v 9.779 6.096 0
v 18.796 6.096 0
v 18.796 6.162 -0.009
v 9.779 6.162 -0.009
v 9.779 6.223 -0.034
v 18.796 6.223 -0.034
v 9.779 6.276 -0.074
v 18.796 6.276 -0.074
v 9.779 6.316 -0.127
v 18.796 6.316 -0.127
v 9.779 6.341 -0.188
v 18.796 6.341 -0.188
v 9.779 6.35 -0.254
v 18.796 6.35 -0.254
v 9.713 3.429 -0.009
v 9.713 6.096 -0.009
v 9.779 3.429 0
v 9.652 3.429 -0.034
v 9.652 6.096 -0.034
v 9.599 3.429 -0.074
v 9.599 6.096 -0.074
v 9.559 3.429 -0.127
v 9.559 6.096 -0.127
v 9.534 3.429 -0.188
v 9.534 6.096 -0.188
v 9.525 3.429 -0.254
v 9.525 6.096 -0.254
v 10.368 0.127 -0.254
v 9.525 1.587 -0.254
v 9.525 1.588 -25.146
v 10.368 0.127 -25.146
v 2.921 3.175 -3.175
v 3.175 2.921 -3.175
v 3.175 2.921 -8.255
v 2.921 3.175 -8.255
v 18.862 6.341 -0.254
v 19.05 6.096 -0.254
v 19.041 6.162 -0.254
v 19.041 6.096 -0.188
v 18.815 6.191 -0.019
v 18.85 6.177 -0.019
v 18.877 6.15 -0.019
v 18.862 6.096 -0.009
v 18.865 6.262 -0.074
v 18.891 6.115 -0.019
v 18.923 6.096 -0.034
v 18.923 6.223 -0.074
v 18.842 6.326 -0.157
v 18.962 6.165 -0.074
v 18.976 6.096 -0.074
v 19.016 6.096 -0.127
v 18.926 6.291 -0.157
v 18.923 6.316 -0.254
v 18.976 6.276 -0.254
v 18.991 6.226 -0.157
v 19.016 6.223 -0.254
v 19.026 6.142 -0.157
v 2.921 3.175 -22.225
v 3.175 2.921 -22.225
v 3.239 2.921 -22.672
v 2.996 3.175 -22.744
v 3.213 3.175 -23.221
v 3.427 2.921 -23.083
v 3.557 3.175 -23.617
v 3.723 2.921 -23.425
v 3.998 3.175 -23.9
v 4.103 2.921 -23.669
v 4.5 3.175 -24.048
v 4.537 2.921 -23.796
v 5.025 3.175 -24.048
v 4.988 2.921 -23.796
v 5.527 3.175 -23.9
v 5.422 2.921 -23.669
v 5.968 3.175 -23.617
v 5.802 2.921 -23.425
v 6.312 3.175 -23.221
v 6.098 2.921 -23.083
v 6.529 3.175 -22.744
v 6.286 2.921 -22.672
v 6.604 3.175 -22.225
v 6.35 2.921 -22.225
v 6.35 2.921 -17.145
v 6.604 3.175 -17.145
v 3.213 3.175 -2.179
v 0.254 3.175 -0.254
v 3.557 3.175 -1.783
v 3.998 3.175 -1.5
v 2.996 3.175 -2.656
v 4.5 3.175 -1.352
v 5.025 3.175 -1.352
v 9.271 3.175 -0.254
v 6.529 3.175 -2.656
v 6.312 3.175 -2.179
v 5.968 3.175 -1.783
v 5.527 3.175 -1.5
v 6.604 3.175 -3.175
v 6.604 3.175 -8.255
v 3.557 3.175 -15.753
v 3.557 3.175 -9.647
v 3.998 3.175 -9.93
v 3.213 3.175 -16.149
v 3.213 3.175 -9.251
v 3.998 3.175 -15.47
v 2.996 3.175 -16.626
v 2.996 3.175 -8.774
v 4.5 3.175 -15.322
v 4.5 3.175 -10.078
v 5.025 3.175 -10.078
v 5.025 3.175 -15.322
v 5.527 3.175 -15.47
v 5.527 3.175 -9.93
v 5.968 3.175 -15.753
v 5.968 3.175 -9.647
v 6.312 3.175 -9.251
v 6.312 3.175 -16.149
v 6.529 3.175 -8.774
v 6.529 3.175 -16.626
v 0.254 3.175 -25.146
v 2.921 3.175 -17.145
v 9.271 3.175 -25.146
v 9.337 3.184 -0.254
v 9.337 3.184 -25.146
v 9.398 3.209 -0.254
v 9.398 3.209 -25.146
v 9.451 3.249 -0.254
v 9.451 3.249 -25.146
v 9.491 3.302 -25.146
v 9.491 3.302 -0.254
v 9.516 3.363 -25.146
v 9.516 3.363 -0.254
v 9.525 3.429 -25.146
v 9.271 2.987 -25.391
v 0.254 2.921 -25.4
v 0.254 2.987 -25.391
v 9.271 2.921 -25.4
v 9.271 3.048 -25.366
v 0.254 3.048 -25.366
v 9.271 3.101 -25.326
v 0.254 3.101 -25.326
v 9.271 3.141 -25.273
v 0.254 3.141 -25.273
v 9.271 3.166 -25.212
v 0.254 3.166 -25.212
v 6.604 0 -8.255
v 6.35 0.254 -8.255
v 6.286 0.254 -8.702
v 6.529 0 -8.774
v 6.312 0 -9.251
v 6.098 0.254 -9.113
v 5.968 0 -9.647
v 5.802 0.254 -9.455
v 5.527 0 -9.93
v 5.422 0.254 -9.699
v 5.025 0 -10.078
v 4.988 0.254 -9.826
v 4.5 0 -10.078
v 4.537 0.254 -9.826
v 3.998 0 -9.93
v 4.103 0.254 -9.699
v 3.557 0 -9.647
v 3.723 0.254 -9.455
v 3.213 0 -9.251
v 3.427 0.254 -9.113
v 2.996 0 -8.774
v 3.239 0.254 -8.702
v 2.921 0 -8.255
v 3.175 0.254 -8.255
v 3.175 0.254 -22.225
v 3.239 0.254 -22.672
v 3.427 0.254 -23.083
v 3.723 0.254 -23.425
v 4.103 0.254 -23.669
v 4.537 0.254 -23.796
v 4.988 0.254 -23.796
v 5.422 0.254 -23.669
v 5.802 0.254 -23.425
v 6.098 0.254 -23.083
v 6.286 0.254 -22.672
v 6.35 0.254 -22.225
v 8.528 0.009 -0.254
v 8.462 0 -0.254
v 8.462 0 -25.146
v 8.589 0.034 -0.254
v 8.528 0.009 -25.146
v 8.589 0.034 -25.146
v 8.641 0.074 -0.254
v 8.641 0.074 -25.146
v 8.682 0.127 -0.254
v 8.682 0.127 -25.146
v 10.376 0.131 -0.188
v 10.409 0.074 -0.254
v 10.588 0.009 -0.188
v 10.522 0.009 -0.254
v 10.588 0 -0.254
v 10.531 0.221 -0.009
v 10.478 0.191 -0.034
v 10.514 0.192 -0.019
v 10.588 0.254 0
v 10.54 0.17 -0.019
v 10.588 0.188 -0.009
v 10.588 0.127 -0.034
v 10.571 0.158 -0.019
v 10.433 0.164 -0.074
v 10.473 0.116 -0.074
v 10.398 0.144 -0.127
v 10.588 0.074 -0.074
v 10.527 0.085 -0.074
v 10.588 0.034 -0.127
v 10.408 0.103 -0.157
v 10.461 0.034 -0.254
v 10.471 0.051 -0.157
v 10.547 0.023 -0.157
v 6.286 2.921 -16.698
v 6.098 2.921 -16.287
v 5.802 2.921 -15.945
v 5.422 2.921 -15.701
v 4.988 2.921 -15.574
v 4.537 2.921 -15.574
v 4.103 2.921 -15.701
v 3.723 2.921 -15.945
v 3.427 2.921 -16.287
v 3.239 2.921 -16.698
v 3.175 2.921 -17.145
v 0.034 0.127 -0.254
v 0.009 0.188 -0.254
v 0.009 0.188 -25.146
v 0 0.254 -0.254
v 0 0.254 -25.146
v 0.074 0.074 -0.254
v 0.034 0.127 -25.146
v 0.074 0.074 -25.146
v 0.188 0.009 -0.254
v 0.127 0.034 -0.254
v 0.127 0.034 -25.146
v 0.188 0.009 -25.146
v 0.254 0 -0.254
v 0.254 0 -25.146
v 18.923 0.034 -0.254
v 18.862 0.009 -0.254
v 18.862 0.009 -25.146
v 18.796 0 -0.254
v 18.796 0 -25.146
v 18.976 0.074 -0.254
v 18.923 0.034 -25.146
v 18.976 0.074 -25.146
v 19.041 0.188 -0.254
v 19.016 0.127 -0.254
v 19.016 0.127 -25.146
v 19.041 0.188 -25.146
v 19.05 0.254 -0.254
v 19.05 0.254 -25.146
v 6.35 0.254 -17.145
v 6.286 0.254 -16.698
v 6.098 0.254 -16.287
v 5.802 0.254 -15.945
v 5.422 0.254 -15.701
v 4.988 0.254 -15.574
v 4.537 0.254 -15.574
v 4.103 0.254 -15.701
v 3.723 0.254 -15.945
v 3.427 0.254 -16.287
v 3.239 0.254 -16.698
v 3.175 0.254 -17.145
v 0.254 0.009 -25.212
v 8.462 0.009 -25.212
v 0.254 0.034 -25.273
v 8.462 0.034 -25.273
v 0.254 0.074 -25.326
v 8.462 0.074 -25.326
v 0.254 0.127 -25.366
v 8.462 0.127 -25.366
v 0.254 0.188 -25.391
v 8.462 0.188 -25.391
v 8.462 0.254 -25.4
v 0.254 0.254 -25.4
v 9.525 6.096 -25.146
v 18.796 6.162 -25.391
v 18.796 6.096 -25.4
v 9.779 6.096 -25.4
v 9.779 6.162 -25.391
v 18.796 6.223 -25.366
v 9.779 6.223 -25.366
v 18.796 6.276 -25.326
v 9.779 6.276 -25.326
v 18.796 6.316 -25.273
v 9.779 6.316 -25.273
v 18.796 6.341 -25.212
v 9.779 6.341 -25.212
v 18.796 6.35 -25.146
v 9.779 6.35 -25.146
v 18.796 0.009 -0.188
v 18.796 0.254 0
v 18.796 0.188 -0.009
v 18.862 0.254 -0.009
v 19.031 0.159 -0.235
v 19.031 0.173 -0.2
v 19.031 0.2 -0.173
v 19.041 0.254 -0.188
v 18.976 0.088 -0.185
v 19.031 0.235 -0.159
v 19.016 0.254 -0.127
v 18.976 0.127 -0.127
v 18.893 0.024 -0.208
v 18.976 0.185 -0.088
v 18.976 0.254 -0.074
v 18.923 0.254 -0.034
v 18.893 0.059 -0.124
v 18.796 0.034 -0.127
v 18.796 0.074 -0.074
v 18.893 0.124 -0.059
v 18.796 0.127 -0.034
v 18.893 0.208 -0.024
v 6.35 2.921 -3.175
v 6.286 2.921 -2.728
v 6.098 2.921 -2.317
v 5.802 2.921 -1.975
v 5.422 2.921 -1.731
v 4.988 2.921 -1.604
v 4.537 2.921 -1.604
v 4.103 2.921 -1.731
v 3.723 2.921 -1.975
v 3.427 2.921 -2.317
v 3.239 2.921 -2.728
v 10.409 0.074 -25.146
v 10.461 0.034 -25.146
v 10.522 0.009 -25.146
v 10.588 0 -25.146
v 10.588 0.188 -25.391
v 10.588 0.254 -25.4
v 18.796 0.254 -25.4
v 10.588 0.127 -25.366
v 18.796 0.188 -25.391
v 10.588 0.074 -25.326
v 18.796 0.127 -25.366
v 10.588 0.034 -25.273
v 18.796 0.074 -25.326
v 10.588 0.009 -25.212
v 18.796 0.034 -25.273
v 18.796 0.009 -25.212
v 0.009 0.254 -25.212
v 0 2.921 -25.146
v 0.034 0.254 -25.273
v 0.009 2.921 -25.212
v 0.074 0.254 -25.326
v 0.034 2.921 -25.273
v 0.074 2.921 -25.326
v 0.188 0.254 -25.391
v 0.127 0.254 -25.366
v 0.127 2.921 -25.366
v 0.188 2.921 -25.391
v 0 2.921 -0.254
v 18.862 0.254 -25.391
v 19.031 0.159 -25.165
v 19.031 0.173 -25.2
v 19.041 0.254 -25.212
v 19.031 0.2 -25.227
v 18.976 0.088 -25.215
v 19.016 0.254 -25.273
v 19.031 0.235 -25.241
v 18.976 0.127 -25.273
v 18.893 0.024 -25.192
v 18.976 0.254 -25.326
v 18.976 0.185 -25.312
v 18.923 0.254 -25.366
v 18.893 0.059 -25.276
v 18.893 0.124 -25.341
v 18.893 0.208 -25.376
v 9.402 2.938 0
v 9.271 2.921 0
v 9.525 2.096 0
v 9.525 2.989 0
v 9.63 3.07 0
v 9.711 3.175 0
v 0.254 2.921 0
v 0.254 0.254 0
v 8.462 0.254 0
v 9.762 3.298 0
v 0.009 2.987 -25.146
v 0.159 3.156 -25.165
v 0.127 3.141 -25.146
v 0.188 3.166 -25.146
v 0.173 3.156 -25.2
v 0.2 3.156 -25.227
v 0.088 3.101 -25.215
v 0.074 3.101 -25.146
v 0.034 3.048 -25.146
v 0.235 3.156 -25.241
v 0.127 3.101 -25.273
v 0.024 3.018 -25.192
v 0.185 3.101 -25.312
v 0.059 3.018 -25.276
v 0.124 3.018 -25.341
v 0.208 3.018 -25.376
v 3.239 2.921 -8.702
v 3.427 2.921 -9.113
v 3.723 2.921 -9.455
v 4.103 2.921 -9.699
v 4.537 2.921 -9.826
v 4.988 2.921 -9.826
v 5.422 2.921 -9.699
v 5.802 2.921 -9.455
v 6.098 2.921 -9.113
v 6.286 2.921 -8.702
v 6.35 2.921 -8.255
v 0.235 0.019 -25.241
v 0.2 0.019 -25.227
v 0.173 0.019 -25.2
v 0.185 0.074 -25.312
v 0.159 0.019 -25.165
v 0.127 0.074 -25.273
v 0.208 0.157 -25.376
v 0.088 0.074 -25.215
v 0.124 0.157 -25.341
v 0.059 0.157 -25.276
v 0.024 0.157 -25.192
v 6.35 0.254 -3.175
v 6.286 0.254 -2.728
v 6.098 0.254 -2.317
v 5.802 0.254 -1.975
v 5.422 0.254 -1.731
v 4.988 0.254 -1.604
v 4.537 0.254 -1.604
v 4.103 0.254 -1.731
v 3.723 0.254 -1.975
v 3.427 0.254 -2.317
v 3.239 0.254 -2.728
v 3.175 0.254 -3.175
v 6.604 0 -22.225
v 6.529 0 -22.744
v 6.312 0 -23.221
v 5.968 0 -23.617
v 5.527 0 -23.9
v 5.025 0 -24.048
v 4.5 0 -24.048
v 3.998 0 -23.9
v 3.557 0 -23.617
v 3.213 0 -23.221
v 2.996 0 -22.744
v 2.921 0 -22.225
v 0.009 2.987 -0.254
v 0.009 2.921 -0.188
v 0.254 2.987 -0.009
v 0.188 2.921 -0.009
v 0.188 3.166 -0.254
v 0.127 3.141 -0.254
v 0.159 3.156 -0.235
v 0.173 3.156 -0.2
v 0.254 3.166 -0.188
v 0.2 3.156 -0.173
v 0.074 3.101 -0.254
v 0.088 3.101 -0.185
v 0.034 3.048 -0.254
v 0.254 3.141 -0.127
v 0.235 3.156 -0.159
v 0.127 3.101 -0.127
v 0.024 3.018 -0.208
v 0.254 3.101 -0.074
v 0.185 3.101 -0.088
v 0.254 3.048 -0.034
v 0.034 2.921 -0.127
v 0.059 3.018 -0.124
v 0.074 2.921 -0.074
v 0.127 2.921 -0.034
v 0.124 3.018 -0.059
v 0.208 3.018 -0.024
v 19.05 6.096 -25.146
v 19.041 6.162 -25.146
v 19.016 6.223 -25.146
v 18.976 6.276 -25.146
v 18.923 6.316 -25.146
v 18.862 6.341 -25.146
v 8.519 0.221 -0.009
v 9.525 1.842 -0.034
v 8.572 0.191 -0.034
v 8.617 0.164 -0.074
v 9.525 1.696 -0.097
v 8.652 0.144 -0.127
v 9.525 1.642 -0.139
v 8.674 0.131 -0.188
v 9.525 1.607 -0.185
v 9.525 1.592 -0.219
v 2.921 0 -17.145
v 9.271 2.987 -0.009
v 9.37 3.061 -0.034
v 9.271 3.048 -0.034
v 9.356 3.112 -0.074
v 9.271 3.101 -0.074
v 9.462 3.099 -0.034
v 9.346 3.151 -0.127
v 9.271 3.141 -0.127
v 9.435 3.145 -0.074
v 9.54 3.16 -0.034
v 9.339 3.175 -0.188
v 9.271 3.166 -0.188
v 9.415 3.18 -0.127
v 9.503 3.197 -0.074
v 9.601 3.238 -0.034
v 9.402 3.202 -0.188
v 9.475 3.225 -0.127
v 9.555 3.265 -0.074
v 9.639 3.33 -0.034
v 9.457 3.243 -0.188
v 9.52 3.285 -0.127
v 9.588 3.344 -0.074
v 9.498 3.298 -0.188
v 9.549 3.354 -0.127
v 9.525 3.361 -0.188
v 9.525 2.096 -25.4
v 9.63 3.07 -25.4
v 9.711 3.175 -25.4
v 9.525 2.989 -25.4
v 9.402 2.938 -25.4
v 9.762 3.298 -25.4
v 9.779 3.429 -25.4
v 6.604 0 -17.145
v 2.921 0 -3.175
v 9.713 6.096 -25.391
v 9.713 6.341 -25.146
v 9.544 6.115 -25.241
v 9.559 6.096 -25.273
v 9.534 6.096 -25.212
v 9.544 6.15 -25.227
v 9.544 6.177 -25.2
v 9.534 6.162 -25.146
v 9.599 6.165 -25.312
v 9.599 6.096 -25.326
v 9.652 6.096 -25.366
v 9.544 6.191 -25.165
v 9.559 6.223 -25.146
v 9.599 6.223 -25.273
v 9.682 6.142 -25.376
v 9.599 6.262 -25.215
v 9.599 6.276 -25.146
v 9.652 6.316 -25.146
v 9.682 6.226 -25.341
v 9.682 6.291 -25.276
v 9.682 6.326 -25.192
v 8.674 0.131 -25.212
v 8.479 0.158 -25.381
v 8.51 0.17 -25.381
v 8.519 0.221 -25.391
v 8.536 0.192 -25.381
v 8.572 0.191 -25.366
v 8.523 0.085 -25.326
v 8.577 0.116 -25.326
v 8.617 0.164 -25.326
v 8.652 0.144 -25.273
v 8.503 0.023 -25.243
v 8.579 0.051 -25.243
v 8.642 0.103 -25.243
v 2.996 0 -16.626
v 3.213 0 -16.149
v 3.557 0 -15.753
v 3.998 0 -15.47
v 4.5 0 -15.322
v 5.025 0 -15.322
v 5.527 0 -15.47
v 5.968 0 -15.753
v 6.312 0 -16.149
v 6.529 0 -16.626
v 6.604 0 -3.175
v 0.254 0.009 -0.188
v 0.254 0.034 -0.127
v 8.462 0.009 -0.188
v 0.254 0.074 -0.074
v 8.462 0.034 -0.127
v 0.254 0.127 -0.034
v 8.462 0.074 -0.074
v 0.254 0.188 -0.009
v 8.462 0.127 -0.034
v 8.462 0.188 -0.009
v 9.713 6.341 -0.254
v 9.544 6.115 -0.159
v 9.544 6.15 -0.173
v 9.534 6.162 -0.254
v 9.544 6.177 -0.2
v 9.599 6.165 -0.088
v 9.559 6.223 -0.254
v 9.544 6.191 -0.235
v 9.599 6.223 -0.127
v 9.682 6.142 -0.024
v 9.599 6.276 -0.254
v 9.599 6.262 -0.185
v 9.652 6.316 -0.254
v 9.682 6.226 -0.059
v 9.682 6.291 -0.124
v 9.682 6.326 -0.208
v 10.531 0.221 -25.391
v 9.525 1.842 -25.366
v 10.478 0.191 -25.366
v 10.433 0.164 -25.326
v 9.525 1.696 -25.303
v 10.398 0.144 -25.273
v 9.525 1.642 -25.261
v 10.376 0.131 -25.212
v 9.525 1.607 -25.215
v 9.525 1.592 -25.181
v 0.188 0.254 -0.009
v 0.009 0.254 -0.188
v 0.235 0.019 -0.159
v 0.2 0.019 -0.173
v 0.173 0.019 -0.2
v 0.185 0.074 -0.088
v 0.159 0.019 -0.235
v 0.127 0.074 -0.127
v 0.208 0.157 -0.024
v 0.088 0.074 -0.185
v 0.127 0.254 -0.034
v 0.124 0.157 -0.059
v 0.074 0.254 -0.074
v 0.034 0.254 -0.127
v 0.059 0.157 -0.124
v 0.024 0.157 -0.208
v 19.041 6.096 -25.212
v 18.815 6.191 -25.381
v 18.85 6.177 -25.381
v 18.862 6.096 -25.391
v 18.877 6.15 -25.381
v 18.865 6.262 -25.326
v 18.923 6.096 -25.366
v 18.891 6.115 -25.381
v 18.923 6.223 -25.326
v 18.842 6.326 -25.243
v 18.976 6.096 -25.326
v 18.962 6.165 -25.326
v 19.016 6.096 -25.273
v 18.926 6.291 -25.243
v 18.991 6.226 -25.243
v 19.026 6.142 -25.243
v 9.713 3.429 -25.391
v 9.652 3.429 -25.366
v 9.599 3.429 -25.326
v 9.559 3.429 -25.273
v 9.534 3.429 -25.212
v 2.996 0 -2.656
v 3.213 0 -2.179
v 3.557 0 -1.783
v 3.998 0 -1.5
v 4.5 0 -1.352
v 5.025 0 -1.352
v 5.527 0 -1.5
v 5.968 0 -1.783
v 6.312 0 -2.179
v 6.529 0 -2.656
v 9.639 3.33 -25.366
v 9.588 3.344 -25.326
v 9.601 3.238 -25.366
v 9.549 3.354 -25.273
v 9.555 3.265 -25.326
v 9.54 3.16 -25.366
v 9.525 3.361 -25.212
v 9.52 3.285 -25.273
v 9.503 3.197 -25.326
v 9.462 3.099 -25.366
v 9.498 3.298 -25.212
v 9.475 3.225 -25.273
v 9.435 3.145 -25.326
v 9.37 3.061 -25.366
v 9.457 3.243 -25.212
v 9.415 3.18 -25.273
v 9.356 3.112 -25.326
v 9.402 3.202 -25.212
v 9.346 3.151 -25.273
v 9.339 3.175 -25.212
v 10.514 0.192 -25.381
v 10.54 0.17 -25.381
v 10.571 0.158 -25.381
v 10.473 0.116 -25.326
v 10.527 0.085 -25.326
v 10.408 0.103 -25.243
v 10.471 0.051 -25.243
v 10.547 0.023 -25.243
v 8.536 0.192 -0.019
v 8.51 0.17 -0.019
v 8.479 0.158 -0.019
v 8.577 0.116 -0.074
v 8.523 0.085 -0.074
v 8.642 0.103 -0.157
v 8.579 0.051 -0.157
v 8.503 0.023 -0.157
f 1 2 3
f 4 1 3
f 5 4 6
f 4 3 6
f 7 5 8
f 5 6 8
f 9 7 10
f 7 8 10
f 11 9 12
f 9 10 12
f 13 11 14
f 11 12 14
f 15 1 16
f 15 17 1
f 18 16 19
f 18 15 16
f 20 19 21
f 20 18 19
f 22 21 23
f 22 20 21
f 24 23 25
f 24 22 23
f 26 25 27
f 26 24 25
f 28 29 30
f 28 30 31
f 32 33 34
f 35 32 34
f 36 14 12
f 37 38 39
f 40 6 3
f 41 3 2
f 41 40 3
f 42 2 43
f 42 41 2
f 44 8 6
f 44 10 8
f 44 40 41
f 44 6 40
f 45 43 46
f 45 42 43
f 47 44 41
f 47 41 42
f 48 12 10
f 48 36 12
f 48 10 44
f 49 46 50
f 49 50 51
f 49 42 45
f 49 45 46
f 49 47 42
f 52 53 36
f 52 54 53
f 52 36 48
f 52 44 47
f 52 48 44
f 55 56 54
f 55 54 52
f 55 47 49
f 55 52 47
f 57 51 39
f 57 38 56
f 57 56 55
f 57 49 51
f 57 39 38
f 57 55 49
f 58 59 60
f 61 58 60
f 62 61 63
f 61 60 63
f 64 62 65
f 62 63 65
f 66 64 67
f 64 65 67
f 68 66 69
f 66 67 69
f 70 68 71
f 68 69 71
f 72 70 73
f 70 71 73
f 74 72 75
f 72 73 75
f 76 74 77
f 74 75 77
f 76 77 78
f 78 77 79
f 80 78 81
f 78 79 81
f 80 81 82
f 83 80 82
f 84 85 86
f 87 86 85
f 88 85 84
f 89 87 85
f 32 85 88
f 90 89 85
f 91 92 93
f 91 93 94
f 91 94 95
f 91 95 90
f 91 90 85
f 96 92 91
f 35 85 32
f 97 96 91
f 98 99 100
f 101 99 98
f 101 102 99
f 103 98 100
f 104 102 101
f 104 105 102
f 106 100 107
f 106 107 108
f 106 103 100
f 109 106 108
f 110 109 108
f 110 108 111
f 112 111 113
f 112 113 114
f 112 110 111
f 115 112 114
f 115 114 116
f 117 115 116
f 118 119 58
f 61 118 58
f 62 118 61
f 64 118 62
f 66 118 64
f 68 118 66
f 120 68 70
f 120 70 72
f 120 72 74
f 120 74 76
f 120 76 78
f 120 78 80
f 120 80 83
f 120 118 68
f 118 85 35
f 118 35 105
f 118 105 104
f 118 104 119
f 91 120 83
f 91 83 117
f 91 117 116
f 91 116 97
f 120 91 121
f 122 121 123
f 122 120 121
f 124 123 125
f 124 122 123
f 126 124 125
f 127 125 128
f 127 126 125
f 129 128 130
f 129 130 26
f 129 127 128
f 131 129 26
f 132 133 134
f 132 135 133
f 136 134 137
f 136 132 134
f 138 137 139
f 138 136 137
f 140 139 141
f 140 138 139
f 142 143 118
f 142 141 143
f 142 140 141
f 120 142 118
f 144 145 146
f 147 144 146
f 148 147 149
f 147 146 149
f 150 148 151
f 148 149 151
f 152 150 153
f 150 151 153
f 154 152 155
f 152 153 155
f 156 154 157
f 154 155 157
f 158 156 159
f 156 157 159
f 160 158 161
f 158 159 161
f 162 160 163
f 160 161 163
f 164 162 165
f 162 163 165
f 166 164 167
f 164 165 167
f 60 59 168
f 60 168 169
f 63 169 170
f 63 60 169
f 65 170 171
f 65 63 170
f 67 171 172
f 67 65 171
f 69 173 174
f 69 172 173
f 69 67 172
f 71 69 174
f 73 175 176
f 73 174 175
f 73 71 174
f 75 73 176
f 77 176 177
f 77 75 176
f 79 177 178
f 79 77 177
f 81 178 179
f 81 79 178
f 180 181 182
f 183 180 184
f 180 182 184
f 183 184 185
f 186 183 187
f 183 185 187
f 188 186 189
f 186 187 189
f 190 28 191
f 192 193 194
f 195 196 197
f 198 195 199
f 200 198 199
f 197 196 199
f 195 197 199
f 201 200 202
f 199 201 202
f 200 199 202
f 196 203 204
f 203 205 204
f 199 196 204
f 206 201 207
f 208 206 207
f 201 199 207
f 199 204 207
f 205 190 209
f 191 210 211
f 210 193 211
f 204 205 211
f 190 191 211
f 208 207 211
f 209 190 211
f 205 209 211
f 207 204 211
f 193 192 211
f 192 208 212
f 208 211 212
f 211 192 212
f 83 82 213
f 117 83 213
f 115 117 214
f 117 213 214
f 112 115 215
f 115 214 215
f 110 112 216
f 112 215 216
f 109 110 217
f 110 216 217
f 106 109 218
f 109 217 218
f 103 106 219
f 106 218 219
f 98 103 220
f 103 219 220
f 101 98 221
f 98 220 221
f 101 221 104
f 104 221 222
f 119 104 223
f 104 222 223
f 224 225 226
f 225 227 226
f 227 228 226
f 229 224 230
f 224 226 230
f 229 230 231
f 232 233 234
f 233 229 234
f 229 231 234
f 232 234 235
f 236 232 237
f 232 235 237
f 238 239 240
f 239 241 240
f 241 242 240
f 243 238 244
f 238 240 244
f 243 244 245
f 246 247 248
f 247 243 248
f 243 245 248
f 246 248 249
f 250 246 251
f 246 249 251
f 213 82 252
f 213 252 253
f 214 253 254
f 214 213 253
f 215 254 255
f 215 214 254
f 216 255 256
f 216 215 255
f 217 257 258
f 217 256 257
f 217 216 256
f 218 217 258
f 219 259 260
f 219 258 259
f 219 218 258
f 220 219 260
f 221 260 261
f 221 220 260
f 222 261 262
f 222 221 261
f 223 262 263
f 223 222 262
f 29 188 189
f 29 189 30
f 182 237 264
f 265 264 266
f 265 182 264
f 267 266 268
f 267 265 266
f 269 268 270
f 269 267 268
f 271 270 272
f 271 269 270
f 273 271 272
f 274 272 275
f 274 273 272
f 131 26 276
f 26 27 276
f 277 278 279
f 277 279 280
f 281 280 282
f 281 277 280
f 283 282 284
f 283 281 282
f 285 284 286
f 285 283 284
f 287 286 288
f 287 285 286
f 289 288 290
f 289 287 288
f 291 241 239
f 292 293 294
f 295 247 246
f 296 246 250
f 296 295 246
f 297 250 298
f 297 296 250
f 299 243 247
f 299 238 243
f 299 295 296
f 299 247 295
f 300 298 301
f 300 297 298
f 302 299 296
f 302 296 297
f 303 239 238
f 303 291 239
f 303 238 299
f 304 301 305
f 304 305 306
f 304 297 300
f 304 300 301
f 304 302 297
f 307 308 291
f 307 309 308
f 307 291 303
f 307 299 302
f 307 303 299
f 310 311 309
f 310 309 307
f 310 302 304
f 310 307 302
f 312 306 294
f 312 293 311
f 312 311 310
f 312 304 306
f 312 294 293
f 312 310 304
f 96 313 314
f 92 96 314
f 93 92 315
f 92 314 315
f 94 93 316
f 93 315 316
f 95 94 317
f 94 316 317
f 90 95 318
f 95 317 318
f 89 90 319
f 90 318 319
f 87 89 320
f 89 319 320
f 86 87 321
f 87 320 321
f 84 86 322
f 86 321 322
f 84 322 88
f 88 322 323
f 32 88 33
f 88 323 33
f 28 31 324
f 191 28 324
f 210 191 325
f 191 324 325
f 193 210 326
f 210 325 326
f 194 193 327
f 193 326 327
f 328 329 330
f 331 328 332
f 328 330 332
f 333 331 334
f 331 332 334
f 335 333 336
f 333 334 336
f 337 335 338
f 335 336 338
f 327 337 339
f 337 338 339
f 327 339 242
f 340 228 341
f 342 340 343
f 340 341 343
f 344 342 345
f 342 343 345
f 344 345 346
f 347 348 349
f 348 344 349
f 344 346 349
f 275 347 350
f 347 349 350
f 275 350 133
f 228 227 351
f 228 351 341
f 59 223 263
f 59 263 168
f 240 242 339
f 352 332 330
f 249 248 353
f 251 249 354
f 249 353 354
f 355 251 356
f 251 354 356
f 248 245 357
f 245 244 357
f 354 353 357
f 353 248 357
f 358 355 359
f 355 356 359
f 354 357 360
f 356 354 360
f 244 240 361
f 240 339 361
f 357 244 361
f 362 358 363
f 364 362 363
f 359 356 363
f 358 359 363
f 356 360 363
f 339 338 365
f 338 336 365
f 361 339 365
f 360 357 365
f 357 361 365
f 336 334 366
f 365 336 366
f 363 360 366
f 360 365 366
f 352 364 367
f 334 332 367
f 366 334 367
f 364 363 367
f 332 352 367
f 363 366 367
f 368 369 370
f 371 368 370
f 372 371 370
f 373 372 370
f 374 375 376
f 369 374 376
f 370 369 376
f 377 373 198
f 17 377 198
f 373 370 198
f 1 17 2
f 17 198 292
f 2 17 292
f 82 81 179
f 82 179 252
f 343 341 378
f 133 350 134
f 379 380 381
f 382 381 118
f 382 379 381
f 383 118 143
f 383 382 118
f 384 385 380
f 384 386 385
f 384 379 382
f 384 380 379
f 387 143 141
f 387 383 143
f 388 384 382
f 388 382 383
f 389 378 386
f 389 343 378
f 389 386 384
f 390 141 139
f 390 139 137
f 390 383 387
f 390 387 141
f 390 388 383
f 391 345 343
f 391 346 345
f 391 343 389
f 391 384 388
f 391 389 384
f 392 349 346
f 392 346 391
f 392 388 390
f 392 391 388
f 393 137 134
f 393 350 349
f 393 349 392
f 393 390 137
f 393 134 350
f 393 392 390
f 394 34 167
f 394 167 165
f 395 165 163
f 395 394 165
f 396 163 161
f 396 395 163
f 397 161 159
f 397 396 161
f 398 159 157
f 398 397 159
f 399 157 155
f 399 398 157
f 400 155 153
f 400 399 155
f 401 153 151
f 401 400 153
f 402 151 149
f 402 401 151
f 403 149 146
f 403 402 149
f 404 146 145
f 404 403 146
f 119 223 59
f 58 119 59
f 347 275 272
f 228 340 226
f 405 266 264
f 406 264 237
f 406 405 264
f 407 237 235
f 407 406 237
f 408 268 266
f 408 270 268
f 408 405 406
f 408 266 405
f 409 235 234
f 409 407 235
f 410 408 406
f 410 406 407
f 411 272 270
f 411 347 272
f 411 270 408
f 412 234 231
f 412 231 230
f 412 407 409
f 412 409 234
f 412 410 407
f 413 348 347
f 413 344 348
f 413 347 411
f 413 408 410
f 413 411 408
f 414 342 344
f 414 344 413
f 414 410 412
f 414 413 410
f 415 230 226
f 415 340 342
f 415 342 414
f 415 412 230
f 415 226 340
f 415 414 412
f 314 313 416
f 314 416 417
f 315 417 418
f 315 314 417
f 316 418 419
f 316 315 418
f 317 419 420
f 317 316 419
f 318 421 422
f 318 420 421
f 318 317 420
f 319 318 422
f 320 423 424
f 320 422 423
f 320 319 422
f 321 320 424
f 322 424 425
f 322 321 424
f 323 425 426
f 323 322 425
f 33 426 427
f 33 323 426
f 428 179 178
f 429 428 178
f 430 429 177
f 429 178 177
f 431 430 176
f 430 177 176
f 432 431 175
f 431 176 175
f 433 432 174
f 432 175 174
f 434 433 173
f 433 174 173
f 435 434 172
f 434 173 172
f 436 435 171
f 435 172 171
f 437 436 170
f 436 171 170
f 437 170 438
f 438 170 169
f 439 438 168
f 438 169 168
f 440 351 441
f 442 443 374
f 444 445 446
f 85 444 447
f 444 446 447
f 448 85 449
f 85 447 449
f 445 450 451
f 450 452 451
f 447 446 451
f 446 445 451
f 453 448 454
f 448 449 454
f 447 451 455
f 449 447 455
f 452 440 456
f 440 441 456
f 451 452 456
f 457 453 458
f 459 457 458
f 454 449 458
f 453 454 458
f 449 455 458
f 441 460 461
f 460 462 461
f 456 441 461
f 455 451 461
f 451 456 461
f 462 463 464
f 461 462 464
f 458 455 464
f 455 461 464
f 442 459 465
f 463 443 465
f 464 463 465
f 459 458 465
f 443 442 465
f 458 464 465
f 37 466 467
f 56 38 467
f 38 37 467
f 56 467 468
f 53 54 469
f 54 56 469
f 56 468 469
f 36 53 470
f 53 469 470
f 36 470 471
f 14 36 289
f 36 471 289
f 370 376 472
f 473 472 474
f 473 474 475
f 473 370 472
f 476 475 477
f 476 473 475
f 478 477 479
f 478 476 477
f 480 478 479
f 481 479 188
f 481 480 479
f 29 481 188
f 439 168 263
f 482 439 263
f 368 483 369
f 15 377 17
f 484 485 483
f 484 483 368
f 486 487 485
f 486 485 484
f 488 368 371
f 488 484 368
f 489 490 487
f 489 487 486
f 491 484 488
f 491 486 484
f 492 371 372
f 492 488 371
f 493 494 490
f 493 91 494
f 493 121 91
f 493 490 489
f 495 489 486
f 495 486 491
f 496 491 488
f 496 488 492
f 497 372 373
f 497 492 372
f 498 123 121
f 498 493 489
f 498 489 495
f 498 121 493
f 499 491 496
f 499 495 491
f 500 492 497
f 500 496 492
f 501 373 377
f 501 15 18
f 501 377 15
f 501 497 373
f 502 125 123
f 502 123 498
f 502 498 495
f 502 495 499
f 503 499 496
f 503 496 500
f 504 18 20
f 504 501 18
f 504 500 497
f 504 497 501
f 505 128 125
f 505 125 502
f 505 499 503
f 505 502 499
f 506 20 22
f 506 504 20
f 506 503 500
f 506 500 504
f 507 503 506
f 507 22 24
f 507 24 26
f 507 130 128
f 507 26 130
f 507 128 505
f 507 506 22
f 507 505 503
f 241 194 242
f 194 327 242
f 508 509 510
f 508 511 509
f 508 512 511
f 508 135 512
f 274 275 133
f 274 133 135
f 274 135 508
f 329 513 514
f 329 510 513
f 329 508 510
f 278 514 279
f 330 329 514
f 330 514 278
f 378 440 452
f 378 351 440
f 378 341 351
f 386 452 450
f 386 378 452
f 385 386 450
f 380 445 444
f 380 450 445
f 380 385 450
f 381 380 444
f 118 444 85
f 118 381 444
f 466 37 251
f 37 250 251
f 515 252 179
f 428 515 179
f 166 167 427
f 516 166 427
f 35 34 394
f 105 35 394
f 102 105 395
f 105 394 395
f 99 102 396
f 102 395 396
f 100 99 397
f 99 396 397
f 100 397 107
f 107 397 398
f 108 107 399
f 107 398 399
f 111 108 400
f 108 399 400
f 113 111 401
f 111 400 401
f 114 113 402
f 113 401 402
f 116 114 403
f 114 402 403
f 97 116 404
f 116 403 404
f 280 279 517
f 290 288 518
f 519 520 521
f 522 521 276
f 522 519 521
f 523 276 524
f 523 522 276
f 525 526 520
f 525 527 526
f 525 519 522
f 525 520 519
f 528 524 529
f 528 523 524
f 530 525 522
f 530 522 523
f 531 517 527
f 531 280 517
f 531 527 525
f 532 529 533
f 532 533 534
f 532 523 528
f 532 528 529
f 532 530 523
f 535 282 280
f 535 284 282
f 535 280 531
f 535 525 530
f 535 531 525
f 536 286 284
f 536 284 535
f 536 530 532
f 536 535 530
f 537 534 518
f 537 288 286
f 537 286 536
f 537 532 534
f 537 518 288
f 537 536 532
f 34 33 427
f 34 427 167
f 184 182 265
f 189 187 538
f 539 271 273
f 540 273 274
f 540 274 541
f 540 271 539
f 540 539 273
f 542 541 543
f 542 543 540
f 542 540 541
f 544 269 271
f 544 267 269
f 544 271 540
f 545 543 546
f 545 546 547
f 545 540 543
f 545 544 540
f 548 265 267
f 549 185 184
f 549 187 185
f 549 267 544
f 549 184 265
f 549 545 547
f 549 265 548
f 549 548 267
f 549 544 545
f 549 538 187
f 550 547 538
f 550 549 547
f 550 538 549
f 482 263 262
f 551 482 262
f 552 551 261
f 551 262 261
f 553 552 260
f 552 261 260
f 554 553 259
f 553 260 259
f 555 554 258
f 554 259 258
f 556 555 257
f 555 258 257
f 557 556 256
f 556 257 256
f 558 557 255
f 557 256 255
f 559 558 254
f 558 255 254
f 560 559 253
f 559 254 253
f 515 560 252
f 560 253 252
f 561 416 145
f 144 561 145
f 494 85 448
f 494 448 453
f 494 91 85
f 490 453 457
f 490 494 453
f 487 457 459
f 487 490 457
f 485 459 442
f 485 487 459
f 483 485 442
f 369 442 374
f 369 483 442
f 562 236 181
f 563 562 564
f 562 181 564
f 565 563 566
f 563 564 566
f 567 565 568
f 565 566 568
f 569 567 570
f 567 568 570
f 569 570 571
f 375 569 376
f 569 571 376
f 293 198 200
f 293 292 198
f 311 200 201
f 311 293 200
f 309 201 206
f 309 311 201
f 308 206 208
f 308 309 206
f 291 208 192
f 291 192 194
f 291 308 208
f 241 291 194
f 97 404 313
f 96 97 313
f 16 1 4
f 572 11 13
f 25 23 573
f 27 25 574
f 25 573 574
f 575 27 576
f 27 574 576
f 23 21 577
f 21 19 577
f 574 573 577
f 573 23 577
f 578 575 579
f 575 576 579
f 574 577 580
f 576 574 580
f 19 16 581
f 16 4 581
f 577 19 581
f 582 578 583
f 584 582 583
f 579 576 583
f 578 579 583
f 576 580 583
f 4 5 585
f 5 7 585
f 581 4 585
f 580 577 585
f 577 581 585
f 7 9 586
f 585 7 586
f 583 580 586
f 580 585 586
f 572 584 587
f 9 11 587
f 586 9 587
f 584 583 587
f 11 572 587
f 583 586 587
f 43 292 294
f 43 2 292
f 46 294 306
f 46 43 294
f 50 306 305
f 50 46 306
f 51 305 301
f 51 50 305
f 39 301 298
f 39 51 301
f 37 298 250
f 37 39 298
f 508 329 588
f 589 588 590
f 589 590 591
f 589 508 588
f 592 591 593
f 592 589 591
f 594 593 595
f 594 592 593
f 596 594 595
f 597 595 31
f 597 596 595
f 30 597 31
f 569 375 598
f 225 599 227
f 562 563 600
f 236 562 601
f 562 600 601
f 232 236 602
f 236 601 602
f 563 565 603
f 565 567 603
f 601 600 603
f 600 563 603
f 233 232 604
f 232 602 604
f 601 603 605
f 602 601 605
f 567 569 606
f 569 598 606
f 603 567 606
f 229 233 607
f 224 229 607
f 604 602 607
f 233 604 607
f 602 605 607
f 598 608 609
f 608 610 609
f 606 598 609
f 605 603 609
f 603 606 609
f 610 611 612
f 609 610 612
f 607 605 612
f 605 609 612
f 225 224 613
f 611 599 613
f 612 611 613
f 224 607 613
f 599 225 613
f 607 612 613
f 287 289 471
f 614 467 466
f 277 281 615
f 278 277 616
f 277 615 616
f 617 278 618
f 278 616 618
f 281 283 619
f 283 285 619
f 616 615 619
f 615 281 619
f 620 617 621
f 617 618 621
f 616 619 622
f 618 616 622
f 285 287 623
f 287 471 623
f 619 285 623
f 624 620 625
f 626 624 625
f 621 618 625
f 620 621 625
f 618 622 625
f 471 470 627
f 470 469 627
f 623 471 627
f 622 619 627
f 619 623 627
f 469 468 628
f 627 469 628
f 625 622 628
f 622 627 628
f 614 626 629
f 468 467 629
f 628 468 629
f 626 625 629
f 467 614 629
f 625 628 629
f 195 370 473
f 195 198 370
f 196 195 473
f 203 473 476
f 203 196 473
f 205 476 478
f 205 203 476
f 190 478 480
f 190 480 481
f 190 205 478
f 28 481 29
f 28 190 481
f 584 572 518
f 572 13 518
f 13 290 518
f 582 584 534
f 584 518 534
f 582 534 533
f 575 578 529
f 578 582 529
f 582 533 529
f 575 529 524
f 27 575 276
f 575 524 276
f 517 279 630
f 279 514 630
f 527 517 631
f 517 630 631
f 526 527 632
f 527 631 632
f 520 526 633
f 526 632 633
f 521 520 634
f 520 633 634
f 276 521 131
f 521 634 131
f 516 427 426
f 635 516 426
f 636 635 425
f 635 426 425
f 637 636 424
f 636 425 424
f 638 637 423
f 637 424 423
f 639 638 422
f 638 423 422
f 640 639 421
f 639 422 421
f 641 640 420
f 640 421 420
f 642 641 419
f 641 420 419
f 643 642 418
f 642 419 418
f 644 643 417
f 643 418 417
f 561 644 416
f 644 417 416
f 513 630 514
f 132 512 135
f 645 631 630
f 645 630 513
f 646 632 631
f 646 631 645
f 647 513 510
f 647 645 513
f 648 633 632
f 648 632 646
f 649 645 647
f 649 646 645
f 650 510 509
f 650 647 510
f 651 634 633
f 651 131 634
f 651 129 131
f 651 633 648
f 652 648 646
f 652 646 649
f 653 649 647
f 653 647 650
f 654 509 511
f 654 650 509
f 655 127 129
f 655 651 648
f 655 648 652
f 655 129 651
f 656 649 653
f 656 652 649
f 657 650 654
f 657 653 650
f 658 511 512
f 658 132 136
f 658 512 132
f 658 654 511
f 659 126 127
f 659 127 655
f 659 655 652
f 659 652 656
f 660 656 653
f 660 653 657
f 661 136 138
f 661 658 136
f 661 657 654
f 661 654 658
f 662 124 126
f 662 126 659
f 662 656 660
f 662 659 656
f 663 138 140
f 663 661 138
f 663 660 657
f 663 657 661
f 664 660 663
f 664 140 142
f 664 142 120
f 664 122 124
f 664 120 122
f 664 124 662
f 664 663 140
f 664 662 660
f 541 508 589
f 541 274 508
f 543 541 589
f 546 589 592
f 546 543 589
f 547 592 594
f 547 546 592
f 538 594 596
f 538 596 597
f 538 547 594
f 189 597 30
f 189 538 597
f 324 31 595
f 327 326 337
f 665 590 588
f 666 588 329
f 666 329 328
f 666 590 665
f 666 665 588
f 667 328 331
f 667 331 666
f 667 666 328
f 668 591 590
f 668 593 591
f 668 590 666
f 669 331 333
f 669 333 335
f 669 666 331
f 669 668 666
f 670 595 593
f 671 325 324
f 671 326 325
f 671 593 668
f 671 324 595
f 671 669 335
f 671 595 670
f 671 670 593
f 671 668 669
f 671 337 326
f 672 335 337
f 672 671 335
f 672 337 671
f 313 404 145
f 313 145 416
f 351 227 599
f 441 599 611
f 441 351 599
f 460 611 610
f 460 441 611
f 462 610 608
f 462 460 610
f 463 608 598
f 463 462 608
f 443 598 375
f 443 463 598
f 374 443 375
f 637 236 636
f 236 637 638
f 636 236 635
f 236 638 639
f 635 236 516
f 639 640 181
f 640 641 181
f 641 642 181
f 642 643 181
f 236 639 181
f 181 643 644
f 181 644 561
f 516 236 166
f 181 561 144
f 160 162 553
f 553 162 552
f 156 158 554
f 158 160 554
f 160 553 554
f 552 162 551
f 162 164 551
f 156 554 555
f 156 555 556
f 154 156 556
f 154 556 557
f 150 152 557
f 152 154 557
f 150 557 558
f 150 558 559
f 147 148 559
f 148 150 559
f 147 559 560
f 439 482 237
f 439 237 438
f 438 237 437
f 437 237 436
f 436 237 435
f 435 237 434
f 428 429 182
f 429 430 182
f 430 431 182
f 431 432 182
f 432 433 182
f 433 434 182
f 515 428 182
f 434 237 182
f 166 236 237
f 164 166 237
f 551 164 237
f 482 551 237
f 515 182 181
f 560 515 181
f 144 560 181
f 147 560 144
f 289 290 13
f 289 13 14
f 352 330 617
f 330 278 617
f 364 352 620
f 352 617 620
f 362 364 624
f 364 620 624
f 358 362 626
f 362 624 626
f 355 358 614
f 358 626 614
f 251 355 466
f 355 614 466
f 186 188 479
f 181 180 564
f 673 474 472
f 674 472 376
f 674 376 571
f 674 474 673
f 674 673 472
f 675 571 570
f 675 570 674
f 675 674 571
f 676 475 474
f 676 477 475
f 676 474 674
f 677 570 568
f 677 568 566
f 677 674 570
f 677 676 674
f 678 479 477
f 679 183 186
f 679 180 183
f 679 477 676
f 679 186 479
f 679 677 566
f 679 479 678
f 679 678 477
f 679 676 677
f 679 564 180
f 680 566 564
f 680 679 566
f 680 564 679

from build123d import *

# Parameters (mm, degrees)
SKETCH1_W           = 19.05
SKETCH1_H           = 25.4
BOSS_EXTRUDE1_DEPTH = 6.35
SKETCH2_W           = 9.525
SKETCH2_H           = 25.4
CUT_EXTRUDE1_DEPTH  = 3.175
CUT_EXTRUDE2_DEPTH  = 26.4
CUT_EXTRUDE3_DEPTH  = 4.175
FILLET1_R           = 0.254
CHAMFER1_SIZE       = 0.254


with BuildPart() as part:
    # Sketch1 → Boss-Extrude1 (new body)
    with BuildSketch(Plane(origin=(0, 0, 0), x_dir=(1, 0, 0), z_dir=(0, 1, 0))):
        with Locations((9.525, 12.7)):
            Rectangle(SKETCH1_W, SKETCH1_H)
    extrude(amount=BOSS_EXTRUDE1_DEPTH)

    # Sketch2 → Cut-Extrude1 (cut)
    with BuildSketch(Plane(origin=(0, 6.35, 0), x_dir=(1, 0, 0), z_dir=(0, 1, 0))):
        with Locations((4.7625, 12.7)):
            Rectangle(SKETCH2_W, SKETCH2_H)
    extrude(amount=-CUT_EXTRUDE1_DEPTH, mode=Mode.SUBTRACT)

    # Sketch3 → Cut-Extrude2 (cut, through all)
    with BuildSketch(Plane.XY):
        Polygon((8.608456448, 0), (9.525, 1.5875), (10.441543552, 0), align=None)
    extrude(amount=-CUT_EXTRUDE2_DEPTH, mode=Mode.SUBTRACT)

    # Sketch4 → Cut-Extrude3 (cut, through all)
    with BuildSketch(Plane(origin=(0, 3.175, 0), x_dir=(1, 0, 0), z_dir=(0, 1, 0))):
        with BuildLine():
            Line((6.35, 22.225), (6.35, 17.145))
            ThreePointArc((6.35, 17.145), (4.7625, 15.5575), (3.175, 17.145))
            Line((3.175, 17.145), (3.175, 22.225))
            ThreePointArc((3.175, 22.225), (4.7625, 23.8125), (6.35, 22.225))
        make_face()
        with BuildLine():
            Line((6.35, 8.255), (6.35, 3.175))
            ThreePointArc((6.35, 3.175), (4.7625, 1.5875), (3.175, 3.175))
            Line((3.175, 3.175), (3.175, 8.255))
            ThreePointArc((3.175, 8.255), (4.7625, 9.8425), (6.35, 8.255))
        make_face()
    extrude(amount=-CUT_EXTRUDE3_DEPTH, mode=Mode.SUBTRACT)

    # Fillet1
    fillet1_edges = [part.edges().sort_by_distance(p)[0] for p in [
        (19.05, 6.35, -12.7),
        (14.2875, 6.35, -25.4),
        (14.2875, 6.35, 0),
        (0, 1.5875, -25.4),
        (0, 1.5875, 0),
        (0, 3.175, -12.7),
        (4.7625, 3.175, -25.4),
        (9.525, 3.175, -12.7),
        (9.525, 4.7625, -25.4),
        (4.7625, 3.175, 0),
        (9.525, 4.7625, 0),
        (9.525, 6.35, -12.7),
        (4.304228224, 0, -25.4),
        (14.745771776, 0, 0),
        (10.441543552, 0, -12.7),
        (9.066728224, 0.79375, -25.4),
        (8.608456448, 0, -12.7),
        (9.983271776, 0.79375, -25.4),
        (9.983271776, 0.79375, 0),
        (9.066728224, 0.79375, 0),
        (14.745771776, 0, -25.4),
        (19.05, 0, -12.7),
        (4.304228224, 0, 0),
        (0, 0, -12.7),
        (19.05, 3.175, -25.4),
        (19.05, 3.175, 0),
    ]]
    fillet(fillet1_edges, radius=FILLET1_R)

    # Chamfer1
    chamfer1_edges = [part.edges().sort_by_distance(p)[0] for p in [
        (4.7625, 0, -23.8125),
        (6.35, 0, -19.685),
        (4.7625, 0, -15.5575),
        (3.175, 0, -19.685),
        (4.7625, 3.175, -23.8125),
        (3.175, 3.175, -19.685),
        (4.7625, 3.175, -15.5575),
        (6.35, 3.175, -19.685),
        (4.7625, 0, -9.8425),
        (6.35, 0, -5.715),
        (4.7625, 0, -1.5875),
        (3.175, 0, -5.715),
        (4.7625, 3.175, -9.8425),
        (3.175, 3.175, -5.715),
        (4.7625, 3.175, -1.5875),
        (6.35, 3.175, -5.715),
    ]]
    chamfer(chamfer1_edges, length=CHAMFER1_SIZE)


solid = part.part
